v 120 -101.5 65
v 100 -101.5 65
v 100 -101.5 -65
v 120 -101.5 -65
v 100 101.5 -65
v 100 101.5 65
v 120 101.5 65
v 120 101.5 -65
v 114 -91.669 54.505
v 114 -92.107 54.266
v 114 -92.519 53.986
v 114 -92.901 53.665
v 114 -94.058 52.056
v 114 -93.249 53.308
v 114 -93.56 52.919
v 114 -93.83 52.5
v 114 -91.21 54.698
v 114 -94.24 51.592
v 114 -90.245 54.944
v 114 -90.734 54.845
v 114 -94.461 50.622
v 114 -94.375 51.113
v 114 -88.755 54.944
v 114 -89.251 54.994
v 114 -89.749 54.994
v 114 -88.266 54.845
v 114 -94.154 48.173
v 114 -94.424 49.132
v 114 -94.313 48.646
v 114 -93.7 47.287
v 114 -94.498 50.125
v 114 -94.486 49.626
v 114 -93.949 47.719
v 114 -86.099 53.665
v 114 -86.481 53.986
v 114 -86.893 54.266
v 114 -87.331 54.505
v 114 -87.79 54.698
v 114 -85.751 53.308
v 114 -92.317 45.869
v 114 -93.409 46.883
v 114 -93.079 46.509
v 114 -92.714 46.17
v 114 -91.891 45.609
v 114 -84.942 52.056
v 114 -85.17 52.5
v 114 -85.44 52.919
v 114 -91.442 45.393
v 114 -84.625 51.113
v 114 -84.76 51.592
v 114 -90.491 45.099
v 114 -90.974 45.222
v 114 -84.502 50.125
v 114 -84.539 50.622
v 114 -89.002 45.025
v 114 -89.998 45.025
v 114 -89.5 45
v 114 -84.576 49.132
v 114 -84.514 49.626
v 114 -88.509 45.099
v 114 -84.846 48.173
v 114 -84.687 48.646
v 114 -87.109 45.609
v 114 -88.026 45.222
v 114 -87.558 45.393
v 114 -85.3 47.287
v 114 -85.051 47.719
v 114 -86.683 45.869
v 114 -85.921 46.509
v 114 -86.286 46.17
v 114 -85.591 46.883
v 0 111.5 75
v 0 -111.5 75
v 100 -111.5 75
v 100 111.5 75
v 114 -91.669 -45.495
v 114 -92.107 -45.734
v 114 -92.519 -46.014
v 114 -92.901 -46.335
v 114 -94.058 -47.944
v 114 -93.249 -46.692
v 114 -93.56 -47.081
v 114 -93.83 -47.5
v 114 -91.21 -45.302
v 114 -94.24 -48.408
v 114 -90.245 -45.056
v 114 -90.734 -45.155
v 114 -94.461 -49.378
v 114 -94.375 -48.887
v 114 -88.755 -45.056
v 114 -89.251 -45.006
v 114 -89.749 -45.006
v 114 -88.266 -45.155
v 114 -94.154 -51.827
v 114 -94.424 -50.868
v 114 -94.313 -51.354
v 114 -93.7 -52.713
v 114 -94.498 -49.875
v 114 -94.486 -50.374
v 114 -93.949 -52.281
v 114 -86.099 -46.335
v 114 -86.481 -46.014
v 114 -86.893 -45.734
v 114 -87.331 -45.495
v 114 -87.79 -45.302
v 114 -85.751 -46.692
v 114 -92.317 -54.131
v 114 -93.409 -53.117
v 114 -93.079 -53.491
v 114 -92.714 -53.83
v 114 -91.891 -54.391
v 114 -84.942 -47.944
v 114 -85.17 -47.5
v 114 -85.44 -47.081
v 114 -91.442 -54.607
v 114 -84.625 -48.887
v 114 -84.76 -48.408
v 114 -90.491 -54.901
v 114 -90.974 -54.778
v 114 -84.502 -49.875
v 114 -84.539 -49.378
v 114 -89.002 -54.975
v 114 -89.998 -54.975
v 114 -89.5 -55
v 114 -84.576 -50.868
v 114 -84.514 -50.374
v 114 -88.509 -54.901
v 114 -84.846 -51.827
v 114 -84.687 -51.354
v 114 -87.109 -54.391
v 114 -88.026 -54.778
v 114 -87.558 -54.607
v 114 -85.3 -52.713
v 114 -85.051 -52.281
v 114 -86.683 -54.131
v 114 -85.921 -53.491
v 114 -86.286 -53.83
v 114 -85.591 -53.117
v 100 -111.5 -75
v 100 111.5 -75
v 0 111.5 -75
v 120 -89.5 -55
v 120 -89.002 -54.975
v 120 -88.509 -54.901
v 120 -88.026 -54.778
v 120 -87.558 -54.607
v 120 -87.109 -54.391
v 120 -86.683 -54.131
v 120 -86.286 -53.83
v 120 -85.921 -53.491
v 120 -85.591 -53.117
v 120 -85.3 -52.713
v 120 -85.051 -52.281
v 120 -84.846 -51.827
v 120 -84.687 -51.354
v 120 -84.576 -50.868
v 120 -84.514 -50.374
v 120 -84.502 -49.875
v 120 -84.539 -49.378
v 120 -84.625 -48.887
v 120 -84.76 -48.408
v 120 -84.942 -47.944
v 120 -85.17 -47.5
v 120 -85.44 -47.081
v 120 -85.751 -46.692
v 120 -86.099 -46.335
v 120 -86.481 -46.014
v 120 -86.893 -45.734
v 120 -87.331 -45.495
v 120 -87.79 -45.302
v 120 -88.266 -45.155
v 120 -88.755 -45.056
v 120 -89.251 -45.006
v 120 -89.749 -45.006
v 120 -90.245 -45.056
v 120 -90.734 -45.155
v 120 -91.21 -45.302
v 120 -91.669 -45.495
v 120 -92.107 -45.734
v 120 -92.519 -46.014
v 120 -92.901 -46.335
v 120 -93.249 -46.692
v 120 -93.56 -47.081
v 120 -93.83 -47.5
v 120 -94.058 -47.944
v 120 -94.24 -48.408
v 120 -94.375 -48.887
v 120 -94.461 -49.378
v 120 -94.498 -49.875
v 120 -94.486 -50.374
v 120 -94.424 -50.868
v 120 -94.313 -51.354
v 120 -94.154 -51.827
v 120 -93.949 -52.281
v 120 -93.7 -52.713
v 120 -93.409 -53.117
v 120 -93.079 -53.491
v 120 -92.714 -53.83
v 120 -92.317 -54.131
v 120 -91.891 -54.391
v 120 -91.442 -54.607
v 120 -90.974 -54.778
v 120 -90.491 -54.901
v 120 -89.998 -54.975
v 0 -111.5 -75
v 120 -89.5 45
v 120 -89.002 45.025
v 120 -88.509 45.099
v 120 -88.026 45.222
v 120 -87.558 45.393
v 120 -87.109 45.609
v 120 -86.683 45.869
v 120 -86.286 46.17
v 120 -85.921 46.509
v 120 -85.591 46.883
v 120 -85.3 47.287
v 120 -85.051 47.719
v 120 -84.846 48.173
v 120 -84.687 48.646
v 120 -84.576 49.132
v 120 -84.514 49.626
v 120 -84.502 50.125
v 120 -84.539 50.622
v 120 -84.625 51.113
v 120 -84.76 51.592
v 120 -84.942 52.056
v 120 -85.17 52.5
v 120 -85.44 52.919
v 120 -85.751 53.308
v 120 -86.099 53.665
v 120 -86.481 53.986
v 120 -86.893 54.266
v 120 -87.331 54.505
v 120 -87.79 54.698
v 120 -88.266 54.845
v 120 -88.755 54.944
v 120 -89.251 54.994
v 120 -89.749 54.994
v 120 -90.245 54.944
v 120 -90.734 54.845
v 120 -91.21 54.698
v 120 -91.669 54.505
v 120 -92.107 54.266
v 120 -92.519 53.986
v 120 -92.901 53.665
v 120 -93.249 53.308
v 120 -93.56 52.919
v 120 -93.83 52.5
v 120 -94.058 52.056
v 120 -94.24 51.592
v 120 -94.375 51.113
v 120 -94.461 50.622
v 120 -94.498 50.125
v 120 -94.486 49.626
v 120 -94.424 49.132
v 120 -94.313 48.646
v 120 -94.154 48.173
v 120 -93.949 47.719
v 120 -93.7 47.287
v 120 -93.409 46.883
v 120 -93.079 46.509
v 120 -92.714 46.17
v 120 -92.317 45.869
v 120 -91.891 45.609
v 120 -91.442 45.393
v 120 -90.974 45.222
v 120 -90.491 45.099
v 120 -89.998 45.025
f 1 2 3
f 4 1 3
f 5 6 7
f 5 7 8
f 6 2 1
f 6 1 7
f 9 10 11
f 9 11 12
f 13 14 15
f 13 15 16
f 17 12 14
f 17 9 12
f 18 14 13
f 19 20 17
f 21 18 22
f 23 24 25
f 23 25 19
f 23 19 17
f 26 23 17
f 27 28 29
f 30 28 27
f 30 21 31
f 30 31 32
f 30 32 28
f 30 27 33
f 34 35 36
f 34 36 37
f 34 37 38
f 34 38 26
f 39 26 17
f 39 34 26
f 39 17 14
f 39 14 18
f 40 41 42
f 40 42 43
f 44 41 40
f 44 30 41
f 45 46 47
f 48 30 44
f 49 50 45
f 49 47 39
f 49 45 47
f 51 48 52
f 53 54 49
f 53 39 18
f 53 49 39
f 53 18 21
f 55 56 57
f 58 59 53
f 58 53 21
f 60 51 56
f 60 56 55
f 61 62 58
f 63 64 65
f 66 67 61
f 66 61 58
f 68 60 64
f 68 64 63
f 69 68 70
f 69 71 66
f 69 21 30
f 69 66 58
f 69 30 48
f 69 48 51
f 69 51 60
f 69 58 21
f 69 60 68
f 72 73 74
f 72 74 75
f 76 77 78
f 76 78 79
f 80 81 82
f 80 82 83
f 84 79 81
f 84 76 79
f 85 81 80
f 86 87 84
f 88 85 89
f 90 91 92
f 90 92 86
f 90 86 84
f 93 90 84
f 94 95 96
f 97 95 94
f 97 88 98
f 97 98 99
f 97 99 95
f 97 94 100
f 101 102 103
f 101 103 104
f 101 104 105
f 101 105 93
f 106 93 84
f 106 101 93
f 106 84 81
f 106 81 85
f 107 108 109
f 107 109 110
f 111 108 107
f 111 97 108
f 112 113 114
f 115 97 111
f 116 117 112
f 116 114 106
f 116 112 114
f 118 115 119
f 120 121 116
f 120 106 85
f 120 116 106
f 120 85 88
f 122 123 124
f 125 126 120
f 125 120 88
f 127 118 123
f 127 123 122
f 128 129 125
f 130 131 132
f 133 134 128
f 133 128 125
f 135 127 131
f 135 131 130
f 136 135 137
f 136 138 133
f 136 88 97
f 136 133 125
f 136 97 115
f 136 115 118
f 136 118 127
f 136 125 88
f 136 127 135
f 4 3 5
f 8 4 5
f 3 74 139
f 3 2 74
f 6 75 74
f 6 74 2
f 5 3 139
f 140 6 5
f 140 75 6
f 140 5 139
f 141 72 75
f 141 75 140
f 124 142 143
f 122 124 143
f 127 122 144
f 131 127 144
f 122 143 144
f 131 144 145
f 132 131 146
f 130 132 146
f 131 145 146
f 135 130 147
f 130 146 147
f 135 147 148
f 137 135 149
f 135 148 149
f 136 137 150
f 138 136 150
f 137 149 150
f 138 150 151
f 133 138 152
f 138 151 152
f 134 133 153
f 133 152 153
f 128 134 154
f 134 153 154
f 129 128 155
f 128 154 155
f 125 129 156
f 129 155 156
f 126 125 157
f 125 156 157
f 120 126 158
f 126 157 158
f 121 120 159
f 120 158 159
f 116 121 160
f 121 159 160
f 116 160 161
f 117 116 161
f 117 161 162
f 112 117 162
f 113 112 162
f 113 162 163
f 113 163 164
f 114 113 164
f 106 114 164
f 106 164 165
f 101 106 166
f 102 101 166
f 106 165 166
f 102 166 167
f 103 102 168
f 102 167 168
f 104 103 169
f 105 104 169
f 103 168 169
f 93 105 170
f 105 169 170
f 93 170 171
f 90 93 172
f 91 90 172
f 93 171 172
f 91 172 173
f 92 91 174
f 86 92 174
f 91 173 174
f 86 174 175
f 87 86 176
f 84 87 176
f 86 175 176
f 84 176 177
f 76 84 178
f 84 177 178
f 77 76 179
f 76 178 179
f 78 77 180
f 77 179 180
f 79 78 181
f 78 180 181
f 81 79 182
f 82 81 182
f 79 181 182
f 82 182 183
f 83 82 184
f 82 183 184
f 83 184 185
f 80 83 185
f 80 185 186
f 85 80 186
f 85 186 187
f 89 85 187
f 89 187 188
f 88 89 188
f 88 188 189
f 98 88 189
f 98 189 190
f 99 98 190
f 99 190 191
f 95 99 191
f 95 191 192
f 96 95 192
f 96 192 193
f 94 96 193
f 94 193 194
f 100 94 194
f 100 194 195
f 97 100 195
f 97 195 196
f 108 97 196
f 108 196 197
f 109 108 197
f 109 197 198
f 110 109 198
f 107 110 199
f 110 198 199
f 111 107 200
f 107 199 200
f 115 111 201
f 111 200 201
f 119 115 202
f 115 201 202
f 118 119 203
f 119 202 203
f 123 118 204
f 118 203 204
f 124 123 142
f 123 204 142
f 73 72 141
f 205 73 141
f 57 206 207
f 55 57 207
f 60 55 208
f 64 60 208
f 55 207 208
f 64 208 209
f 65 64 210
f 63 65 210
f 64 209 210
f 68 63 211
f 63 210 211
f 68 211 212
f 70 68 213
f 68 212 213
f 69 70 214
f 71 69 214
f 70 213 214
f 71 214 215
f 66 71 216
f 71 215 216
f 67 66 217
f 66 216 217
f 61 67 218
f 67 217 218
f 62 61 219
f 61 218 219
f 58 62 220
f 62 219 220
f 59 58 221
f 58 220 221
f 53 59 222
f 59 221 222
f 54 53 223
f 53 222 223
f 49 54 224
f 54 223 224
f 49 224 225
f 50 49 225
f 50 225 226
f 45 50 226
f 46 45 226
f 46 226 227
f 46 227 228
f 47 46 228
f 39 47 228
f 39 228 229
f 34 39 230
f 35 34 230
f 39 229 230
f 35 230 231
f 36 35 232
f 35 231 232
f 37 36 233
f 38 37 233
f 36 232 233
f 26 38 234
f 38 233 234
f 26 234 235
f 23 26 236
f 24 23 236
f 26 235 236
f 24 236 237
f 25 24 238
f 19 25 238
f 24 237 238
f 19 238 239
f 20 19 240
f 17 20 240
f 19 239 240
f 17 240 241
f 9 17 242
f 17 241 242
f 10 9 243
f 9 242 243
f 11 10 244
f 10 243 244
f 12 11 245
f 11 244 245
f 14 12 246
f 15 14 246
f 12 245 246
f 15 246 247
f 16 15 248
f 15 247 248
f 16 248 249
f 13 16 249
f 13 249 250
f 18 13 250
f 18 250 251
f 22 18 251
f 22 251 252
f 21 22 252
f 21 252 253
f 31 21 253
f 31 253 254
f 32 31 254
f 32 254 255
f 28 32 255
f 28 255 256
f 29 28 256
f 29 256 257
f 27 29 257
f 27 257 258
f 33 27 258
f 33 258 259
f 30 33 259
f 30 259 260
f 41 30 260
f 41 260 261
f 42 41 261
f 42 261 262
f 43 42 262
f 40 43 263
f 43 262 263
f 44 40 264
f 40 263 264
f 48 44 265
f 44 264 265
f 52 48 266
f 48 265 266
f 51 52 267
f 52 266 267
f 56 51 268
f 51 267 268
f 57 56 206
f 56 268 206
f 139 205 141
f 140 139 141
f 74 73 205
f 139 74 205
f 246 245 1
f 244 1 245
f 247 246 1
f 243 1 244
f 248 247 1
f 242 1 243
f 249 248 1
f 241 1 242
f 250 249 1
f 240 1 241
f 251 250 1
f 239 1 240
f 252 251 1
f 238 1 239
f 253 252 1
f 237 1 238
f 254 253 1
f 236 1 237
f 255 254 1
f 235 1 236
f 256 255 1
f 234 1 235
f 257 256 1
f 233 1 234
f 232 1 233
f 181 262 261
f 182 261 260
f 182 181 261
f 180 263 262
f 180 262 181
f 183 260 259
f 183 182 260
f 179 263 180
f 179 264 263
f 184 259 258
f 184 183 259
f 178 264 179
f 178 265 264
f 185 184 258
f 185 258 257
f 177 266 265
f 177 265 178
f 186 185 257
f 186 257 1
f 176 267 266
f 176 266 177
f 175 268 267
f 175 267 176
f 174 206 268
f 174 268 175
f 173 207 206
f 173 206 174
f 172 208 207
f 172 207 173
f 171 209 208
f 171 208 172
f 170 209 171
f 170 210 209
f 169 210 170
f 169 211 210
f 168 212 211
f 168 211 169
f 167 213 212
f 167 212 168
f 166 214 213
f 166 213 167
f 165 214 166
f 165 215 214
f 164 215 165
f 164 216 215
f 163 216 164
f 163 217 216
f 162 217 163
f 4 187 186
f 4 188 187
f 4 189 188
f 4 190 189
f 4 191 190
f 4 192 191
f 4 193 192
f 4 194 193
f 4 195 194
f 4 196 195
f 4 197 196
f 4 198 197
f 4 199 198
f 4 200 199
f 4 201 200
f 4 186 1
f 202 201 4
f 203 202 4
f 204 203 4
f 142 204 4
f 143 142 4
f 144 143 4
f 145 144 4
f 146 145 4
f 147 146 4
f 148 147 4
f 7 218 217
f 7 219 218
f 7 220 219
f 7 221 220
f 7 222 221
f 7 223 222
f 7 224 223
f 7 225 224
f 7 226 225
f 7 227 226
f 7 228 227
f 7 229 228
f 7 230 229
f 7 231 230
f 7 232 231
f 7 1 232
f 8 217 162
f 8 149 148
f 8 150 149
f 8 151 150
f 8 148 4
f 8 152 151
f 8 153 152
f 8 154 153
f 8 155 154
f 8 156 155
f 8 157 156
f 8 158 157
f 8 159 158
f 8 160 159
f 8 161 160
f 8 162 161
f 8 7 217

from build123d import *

# Parameters (mm, degrees)
CROQUIS1_W              = 150
CROQUIS1_H              = 223
SALIENTE_EXTRUIR1_DEPTH = 100
CROQUIS2_W              = 130
CROQUIS2_H              = 203
SALIENTE_EXTRUIR2_DEPTH = 20
CROQUIS3_R              = 5
CORTAR_EXTRUIR1_DEPTH   = 6


with BuildPart() as part:
    # Croquis1 → Saliente-Extruir1 (new body)
    with BuildSketch(Plane(origin=(0, 0, 0), x_dir=(0, 0, -1), z_dir=(1, 0, 0))):
        Rectangle(CROQUIS1_W, CROQUIS1_H)
    extrude(amount=SALIENTE_EXTRUIR1_DEPTH)

    # Croquis2 → Saliente-Extruir2 (add)
    with BuildSketch(Plane(origin=(100, 0, 0), x_dir=(0, 0, -1), z_dir=(1, 0, 0))):
        Rectangle(CROQUIS2_W, CROQUIS2_H)
    extrude(amount=SALIENTE_EXTRUIR2_DEPTH)

    # Croquis3 → Cortar-Extruir1 (cut)
    with BuildSketch(Plane(origin=(120, 0, 0), x_dir=(0, 0, -1), z_dir=(1, 0, 0))):
        with Locations((-50, -89.5)):
            Circle(CROQUIS3_R)
        with Locations((50, -89.5)):
            Circle(CROQUIS3_R)
    extrude(amount=-CORTAR_EXTRUIR1_DEPTH, mode=Mode.SUBTRACT)


solid = part.part
